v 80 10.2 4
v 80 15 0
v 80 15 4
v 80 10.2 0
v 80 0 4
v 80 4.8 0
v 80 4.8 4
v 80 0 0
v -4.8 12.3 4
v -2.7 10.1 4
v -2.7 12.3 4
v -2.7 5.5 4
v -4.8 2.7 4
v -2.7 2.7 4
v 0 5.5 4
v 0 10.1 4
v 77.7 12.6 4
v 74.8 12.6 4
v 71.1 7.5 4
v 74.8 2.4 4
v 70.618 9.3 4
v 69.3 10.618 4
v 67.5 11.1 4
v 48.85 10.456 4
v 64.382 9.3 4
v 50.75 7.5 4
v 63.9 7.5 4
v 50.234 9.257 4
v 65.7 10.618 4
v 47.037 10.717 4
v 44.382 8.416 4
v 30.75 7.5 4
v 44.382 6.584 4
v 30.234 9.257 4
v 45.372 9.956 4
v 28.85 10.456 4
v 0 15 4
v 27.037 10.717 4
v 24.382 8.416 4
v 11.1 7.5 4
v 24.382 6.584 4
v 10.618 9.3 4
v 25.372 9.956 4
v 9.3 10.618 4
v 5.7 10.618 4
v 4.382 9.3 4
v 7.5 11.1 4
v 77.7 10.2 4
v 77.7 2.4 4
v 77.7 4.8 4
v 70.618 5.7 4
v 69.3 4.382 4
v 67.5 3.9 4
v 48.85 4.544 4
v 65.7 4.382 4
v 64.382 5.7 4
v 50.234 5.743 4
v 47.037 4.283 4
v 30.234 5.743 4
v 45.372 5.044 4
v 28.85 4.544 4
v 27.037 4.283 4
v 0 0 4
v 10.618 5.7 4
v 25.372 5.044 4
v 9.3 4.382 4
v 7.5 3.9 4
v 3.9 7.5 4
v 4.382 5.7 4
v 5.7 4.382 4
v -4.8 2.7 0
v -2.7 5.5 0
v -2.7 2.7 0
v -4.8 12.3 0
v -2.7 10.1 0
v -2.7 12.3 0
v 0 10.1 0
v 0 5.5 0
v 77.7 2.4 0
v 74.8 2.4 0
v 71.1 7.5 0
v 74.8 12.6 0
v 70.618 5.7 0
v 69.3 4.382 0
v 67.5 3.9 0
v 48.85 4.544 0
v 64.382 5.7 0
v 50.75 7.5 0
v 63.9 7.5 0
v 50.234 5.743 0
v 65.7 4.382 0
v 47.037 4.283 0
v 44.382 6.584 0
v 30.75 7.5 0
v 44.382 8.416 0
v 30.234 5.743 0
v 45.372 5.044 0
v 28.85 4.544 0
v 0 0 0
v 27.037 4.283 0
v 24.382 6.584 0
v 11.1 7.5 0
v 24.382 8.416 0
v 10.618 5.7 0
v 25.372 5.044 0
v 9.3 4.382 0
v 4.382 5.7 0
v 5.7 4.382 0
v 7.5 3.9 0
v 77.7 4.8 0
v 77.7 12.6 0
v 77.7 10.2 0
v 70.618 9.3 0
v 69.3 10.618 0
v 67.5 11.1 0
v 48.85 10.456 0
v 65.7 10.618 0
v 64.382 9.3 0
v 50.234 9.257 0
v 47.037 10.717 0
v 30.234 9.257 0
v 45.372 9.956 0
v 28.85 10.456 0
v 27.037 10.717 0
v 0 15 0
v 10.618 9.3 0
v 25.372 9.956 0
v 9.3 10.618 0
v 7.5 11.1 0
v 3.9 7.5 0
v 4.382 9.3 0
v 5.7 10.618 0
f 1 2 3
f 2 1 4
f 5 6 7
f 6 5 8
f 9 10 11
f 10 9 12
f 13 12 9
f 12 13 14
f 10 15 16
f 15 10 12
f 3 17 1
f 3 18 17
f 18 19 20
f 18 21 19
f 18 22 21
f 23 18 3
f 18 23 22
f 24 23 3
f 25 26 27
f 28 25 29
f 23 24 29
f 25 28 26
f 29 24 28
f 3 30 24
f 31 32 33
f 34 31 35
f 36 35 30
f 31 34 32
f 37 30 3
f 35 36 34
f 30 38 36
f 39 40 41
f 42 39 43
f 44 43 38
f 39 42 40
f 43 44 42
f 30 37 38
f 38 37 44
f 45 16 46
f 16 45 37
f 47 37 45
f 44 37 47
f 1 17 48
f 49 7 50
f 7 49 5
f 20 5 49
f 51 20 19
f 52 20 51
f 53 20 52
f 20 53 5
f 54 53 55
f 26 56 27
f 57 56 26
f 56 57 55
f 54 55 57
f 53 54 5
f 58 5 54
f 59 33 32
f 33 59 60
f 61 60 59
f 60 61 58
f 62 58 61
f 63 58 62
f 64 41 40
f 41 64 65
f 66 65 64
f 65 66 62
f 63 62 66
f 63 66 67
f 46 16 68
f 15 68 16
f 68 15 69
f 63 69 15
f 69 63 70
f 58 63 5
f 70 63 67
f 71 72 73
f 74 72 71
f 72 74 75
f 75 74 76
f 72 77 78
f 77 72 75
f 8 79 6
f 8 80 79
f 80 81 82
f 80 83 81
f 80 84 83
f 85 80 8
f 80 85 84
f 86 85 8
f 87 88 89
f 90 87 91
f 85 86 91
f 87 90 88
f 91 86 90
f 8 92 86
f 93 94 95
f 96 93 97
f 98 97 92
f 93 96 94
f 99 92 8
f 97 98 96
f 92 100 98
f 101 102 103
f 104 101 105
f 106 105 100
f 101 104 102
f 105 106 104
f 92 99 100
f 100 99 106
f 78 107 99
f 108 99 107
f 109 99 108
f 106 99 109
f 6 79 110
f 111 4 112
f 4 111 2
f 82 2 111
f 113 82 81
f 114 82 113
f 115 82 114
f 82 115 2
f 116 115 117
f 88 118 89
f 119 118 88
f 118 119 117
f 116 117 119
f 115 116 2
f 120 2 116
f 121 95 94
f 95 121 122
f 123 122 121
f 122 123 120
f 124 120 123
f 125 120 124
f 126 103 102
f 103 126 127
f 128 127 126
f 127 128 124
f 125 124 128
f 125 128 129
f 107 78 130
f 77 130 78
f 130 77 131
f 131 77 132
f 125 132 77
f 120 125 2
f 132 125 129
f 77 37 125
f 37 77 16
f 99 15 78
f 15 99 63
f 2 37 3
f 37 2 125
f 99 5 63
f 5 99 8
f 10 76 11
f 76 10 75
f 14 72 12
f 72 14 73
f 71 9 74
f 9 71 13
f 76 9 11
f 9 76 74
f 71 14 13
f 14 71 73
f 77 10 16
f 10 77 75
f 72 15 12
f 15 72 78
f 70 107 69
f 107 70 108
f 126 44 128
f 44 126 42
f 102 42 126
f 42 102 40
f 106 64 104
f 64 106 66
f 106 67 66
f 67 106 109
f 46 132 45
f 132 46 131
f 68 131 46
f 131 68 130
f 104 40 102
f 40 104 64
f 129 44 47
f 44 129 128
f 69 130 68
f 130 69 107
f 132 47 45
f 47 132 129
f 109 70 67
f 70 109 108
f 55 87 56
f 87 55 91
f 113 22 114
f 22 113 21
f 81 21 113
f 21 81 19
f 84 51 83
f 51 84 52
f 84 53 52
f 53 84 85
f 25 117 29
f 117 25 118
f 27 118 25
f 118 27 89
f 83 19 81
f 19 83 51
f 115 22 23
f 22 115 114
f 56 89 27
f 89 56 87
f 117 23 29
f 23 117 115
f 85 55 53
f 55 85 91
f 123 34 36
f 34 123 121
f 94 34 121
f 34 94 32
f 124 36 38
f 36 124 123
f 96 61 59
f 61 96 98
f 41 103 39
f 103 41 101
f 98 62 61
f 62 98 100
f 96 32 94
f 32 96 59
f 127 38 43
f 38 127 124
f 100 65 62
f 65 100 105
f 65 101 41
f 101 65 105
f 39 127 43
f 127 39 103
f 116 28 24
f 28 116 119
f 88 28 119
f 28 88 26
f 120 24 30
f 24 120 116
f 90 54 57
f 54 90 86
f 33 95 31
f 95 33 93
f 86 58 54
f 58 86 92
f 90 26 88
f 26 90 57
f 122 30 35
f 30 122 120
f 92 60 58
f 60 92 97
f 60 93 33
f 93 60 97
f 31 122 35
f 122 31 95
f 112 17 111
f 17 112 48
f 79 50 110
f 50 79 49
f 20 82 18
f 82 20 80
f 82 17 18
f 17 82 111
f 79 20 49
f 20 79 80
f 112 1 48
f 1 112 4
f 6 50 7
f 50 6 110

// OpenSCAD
// The goal of that project is to provide combinable spacers for some geophysical measurement equipment. In that case there are two types of hole, large ones for power electrodes and small ones for measurement electrodes.

module spacer_middle()
{  
   difference(){ 
   union(){
    cube([80,15,4]);
     translate([-4.8,2.7,0]){cube([2.1,9.6,4]);
           }
       translate([-4.8,5.5,0]){cube([4.8,4.6,4]);
             }
       }
    translate([ 7.5,7.5,-0.1]){cylinder(4.2,r=3.6);}
    translate([67.5,7.5,-0.1]){cylinder(4.2,r=3.6);}
    translate([27.5,7.5,-0.1]){cylinder(4.2,r=3.25);}    
    translate([47.5,7.5,-0.1]){cylinder(4.2,r=3.25
        );}
    translate([74.8,2.4,-0.1]){cube([2.9,10.2,4.2]);} 
    translate([74.8,4.8,-0.1]){cube([5.3,5.4,4.2]);}
}
}
spacer_middle();
